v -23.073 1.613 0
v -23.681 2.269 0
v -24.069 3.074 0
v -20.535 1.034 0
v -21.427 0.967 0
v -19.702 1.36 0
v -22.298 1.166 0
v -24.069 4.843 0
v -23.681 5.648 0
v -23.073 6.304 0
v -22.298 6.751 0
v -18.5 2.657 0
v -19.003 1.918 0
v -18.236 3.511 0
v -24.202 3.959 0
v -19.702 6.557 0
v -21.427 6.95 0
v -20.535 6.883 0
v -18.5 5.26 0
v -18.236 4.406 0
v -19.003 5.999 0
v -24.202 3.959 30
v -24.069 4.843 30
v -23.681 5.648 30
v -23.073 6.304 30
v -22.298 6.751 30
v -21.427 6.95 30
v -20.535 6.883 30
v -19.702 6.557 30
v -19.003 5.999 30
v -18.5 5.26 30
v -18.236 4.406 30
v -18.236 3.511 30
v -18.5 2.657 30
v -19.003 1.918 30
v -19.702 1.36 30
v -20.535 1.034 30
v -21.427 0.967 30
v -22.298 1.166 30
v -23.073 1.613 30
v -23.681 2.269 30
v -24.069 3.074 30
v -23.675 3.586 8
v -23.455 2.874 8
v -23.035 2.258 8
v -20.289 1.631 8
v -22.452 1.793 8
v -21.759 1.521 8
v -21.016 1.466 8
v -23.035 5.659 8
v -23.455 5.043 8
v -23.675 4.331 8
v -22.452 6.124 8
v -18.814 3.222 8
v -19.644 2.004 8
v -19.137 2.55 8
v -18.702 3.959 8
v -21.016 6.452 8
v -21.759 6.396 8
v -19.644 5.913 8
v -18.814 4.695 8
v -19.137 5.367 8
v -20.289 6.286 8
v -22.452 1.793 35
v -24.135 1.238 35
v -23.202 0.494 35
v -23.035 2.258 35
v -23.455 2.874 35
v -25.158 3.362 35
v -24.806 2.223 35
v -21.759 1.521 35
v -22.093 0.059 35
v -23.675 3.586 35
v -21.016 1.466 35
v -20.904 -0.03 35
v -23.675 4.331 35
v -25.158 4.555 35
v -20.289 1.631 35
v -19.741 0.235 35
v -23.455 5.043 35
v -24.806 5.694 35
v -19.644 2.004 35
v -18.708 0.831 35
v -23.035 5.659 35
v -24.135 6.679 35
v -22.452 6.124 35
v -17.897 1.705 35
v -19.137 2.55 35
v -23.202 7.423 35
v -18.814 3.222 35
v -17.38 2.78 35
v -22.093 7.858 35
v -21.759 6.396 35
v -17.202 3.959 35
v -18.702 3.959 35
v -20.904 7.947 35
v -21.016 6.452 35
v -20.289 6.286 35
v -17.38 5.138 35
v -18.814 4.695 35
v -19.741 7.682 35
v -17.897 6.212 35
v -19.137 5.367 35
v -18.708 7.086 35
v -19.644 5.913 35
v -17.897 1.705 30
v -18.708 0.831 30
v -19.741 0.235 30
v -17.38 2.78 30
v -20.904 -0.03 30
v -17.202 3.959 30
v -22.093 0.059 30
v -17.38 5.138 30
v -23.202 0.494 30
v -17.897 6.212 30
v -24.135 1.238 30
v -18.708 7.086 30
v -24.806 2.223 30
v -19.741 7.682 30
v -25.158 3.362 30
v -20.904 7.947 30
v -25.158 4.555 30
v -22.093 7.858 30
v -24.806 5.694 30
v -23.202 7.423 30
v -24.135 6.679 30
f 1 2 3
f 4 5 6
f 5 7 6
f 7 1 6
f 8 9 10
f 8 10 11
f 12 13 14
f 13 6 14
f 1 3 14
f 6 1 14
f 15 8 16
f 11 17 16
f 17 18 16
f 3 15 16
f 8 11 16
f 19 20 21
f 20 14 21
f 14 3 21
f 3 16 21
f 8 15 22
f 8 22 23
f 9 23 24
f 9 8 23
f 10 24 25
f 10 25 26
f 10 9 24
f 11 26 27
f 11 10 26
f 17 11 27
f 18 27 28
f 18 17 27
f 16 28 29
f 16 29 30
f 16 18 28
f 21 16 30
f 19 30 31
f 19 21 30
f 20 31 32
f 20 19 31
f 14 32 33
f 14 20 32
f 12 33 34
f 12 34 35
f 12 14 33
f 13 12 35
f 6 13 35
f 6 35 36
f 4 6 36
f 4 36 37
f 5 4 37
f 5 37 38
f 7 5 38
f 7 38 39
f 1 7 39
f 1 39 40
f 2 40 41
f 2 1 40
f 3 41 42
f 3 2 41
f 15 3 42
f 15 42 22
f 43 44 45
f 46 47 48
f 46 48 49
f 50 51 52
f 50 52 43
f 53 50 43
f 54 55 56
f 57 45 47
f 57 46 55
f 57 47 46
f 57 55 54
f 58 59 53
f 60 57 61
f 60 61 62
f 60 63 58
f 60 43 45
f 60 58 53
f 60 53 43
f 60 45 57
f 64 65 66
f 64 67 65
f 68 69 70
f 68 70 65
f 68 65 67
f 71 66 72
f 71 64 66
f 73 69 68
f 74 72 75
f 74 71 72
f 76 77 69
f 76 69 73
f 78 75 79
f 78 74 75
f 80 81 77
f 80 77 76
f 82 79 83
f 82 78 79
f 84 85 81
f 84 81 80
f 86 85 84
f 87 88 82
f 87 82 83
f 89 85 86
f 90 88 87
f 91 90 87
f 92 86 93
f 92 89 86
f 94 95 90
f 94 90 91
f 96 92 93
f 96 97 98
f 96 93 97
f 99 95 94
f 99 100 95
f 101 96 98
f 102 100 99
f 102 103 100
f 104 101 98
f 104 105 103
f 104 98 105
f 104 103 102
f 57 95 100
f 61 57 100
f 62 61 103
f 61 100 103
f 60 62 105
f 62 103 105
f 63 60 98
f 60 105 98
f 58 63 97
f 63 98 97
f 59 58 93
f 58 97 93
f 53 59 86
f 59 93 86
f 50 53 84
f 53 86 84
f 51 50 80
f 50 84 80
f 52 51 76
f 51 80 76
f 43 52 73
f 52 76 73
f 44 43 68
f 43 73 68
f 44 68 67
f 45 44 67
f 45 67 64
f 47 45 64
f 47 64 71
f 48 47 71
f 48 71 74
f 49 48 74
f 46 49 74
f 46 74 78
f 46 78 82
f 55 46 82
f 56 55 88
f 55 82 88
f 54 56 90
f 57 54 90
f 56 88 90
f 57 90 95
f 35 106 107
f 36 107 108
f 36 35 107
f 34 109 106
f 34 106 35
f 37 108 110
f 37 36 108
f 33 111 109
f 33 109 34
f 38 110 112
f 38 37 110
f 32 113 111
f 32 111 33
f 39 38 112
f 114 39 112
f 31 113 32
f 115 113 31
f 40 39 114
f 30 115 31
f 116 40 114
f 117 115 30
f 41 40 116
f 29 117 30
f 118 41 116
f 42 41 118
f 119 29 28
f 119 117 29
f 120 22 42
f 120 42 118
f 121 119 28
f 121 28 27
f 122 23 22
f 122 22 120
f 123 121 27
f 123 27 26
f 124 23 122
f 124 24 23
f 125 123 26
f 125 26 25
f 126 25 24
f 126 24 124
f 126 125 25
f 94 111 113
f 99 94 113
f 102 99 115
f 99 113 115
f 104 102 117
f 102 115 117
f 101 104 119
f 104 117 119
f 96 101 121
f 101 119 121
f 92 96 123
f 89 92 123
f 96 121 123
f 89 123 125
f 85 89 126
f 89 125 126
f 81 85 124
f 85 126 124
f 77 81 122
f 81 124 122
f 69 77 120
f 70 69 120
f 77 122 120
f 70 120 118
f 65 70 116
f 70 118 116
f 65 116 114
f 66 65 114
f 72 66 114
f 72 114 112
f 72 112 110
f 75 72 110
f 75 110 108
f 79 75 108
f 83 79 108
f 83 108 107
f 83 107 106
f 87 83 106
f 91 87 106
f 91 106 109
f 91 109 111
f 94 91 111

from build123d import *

# Parameters (mm, degrees)
SKIZZE1_R                       = 4
AUFSATZ_LINEAR_AUSTRAGEN1_DEPTH = 35
SKIZZE2_R                       = 2.5
SCHNITT_LINEAR_AUSTRAGEN1_DEPTH = 27
SKIZZE3_R                       = 12.769442974
SKIZZE3_R_2                     = 3
SCHNITT_LINEAR_AUSTRAGEN2_DEPTH = 30


with BuildPart() as part:
    # Skizze1 → Aufsatz-Linear austragen1 (new body)
    with BuildSketch(Plane.XY):
        with Locations((-21.202438913, 3.95852329)):
            Circle(SKIZZE1_R)
    extrude(amount=AUFSATZ_LINEAR_AUSTRAGEN1_DEPTH)

    # Skizze2 → Schnitt-Linear austragen1 (cut)
    with BuildSketch(Plane.XY.offset(35)):
        with Locations((-21.202438913, 3.95852329)):
            Circle(SKIZZE2_R)
    extrude(amount=-SCHNITT_LINEAR_AUSTRAGEN1_DEPTH, mode=Mode.SUBTRACT)

    # Skizze3 → Schnitt-Linear austragen2 (cut)
    with BuildSketch(Plane(origin=(0, 0, 0), x_dir=(-1, 0, 0), z_dir=(0, 0, -1))):
        with Locations((21.202438913, 3.95852329)):
            Circle(SKIZZE3_R)
        with Locations((21.202438913, 3.95852329)):
            Circle(SKIZZE3_R_2, mode=Mode.SUBTRACT)
    extrude(amount=-SCHNITT_LINEAR_AUSTRAGEN2_DEPTH, mode=Mode.SUBTRACT)


solid = part.part
